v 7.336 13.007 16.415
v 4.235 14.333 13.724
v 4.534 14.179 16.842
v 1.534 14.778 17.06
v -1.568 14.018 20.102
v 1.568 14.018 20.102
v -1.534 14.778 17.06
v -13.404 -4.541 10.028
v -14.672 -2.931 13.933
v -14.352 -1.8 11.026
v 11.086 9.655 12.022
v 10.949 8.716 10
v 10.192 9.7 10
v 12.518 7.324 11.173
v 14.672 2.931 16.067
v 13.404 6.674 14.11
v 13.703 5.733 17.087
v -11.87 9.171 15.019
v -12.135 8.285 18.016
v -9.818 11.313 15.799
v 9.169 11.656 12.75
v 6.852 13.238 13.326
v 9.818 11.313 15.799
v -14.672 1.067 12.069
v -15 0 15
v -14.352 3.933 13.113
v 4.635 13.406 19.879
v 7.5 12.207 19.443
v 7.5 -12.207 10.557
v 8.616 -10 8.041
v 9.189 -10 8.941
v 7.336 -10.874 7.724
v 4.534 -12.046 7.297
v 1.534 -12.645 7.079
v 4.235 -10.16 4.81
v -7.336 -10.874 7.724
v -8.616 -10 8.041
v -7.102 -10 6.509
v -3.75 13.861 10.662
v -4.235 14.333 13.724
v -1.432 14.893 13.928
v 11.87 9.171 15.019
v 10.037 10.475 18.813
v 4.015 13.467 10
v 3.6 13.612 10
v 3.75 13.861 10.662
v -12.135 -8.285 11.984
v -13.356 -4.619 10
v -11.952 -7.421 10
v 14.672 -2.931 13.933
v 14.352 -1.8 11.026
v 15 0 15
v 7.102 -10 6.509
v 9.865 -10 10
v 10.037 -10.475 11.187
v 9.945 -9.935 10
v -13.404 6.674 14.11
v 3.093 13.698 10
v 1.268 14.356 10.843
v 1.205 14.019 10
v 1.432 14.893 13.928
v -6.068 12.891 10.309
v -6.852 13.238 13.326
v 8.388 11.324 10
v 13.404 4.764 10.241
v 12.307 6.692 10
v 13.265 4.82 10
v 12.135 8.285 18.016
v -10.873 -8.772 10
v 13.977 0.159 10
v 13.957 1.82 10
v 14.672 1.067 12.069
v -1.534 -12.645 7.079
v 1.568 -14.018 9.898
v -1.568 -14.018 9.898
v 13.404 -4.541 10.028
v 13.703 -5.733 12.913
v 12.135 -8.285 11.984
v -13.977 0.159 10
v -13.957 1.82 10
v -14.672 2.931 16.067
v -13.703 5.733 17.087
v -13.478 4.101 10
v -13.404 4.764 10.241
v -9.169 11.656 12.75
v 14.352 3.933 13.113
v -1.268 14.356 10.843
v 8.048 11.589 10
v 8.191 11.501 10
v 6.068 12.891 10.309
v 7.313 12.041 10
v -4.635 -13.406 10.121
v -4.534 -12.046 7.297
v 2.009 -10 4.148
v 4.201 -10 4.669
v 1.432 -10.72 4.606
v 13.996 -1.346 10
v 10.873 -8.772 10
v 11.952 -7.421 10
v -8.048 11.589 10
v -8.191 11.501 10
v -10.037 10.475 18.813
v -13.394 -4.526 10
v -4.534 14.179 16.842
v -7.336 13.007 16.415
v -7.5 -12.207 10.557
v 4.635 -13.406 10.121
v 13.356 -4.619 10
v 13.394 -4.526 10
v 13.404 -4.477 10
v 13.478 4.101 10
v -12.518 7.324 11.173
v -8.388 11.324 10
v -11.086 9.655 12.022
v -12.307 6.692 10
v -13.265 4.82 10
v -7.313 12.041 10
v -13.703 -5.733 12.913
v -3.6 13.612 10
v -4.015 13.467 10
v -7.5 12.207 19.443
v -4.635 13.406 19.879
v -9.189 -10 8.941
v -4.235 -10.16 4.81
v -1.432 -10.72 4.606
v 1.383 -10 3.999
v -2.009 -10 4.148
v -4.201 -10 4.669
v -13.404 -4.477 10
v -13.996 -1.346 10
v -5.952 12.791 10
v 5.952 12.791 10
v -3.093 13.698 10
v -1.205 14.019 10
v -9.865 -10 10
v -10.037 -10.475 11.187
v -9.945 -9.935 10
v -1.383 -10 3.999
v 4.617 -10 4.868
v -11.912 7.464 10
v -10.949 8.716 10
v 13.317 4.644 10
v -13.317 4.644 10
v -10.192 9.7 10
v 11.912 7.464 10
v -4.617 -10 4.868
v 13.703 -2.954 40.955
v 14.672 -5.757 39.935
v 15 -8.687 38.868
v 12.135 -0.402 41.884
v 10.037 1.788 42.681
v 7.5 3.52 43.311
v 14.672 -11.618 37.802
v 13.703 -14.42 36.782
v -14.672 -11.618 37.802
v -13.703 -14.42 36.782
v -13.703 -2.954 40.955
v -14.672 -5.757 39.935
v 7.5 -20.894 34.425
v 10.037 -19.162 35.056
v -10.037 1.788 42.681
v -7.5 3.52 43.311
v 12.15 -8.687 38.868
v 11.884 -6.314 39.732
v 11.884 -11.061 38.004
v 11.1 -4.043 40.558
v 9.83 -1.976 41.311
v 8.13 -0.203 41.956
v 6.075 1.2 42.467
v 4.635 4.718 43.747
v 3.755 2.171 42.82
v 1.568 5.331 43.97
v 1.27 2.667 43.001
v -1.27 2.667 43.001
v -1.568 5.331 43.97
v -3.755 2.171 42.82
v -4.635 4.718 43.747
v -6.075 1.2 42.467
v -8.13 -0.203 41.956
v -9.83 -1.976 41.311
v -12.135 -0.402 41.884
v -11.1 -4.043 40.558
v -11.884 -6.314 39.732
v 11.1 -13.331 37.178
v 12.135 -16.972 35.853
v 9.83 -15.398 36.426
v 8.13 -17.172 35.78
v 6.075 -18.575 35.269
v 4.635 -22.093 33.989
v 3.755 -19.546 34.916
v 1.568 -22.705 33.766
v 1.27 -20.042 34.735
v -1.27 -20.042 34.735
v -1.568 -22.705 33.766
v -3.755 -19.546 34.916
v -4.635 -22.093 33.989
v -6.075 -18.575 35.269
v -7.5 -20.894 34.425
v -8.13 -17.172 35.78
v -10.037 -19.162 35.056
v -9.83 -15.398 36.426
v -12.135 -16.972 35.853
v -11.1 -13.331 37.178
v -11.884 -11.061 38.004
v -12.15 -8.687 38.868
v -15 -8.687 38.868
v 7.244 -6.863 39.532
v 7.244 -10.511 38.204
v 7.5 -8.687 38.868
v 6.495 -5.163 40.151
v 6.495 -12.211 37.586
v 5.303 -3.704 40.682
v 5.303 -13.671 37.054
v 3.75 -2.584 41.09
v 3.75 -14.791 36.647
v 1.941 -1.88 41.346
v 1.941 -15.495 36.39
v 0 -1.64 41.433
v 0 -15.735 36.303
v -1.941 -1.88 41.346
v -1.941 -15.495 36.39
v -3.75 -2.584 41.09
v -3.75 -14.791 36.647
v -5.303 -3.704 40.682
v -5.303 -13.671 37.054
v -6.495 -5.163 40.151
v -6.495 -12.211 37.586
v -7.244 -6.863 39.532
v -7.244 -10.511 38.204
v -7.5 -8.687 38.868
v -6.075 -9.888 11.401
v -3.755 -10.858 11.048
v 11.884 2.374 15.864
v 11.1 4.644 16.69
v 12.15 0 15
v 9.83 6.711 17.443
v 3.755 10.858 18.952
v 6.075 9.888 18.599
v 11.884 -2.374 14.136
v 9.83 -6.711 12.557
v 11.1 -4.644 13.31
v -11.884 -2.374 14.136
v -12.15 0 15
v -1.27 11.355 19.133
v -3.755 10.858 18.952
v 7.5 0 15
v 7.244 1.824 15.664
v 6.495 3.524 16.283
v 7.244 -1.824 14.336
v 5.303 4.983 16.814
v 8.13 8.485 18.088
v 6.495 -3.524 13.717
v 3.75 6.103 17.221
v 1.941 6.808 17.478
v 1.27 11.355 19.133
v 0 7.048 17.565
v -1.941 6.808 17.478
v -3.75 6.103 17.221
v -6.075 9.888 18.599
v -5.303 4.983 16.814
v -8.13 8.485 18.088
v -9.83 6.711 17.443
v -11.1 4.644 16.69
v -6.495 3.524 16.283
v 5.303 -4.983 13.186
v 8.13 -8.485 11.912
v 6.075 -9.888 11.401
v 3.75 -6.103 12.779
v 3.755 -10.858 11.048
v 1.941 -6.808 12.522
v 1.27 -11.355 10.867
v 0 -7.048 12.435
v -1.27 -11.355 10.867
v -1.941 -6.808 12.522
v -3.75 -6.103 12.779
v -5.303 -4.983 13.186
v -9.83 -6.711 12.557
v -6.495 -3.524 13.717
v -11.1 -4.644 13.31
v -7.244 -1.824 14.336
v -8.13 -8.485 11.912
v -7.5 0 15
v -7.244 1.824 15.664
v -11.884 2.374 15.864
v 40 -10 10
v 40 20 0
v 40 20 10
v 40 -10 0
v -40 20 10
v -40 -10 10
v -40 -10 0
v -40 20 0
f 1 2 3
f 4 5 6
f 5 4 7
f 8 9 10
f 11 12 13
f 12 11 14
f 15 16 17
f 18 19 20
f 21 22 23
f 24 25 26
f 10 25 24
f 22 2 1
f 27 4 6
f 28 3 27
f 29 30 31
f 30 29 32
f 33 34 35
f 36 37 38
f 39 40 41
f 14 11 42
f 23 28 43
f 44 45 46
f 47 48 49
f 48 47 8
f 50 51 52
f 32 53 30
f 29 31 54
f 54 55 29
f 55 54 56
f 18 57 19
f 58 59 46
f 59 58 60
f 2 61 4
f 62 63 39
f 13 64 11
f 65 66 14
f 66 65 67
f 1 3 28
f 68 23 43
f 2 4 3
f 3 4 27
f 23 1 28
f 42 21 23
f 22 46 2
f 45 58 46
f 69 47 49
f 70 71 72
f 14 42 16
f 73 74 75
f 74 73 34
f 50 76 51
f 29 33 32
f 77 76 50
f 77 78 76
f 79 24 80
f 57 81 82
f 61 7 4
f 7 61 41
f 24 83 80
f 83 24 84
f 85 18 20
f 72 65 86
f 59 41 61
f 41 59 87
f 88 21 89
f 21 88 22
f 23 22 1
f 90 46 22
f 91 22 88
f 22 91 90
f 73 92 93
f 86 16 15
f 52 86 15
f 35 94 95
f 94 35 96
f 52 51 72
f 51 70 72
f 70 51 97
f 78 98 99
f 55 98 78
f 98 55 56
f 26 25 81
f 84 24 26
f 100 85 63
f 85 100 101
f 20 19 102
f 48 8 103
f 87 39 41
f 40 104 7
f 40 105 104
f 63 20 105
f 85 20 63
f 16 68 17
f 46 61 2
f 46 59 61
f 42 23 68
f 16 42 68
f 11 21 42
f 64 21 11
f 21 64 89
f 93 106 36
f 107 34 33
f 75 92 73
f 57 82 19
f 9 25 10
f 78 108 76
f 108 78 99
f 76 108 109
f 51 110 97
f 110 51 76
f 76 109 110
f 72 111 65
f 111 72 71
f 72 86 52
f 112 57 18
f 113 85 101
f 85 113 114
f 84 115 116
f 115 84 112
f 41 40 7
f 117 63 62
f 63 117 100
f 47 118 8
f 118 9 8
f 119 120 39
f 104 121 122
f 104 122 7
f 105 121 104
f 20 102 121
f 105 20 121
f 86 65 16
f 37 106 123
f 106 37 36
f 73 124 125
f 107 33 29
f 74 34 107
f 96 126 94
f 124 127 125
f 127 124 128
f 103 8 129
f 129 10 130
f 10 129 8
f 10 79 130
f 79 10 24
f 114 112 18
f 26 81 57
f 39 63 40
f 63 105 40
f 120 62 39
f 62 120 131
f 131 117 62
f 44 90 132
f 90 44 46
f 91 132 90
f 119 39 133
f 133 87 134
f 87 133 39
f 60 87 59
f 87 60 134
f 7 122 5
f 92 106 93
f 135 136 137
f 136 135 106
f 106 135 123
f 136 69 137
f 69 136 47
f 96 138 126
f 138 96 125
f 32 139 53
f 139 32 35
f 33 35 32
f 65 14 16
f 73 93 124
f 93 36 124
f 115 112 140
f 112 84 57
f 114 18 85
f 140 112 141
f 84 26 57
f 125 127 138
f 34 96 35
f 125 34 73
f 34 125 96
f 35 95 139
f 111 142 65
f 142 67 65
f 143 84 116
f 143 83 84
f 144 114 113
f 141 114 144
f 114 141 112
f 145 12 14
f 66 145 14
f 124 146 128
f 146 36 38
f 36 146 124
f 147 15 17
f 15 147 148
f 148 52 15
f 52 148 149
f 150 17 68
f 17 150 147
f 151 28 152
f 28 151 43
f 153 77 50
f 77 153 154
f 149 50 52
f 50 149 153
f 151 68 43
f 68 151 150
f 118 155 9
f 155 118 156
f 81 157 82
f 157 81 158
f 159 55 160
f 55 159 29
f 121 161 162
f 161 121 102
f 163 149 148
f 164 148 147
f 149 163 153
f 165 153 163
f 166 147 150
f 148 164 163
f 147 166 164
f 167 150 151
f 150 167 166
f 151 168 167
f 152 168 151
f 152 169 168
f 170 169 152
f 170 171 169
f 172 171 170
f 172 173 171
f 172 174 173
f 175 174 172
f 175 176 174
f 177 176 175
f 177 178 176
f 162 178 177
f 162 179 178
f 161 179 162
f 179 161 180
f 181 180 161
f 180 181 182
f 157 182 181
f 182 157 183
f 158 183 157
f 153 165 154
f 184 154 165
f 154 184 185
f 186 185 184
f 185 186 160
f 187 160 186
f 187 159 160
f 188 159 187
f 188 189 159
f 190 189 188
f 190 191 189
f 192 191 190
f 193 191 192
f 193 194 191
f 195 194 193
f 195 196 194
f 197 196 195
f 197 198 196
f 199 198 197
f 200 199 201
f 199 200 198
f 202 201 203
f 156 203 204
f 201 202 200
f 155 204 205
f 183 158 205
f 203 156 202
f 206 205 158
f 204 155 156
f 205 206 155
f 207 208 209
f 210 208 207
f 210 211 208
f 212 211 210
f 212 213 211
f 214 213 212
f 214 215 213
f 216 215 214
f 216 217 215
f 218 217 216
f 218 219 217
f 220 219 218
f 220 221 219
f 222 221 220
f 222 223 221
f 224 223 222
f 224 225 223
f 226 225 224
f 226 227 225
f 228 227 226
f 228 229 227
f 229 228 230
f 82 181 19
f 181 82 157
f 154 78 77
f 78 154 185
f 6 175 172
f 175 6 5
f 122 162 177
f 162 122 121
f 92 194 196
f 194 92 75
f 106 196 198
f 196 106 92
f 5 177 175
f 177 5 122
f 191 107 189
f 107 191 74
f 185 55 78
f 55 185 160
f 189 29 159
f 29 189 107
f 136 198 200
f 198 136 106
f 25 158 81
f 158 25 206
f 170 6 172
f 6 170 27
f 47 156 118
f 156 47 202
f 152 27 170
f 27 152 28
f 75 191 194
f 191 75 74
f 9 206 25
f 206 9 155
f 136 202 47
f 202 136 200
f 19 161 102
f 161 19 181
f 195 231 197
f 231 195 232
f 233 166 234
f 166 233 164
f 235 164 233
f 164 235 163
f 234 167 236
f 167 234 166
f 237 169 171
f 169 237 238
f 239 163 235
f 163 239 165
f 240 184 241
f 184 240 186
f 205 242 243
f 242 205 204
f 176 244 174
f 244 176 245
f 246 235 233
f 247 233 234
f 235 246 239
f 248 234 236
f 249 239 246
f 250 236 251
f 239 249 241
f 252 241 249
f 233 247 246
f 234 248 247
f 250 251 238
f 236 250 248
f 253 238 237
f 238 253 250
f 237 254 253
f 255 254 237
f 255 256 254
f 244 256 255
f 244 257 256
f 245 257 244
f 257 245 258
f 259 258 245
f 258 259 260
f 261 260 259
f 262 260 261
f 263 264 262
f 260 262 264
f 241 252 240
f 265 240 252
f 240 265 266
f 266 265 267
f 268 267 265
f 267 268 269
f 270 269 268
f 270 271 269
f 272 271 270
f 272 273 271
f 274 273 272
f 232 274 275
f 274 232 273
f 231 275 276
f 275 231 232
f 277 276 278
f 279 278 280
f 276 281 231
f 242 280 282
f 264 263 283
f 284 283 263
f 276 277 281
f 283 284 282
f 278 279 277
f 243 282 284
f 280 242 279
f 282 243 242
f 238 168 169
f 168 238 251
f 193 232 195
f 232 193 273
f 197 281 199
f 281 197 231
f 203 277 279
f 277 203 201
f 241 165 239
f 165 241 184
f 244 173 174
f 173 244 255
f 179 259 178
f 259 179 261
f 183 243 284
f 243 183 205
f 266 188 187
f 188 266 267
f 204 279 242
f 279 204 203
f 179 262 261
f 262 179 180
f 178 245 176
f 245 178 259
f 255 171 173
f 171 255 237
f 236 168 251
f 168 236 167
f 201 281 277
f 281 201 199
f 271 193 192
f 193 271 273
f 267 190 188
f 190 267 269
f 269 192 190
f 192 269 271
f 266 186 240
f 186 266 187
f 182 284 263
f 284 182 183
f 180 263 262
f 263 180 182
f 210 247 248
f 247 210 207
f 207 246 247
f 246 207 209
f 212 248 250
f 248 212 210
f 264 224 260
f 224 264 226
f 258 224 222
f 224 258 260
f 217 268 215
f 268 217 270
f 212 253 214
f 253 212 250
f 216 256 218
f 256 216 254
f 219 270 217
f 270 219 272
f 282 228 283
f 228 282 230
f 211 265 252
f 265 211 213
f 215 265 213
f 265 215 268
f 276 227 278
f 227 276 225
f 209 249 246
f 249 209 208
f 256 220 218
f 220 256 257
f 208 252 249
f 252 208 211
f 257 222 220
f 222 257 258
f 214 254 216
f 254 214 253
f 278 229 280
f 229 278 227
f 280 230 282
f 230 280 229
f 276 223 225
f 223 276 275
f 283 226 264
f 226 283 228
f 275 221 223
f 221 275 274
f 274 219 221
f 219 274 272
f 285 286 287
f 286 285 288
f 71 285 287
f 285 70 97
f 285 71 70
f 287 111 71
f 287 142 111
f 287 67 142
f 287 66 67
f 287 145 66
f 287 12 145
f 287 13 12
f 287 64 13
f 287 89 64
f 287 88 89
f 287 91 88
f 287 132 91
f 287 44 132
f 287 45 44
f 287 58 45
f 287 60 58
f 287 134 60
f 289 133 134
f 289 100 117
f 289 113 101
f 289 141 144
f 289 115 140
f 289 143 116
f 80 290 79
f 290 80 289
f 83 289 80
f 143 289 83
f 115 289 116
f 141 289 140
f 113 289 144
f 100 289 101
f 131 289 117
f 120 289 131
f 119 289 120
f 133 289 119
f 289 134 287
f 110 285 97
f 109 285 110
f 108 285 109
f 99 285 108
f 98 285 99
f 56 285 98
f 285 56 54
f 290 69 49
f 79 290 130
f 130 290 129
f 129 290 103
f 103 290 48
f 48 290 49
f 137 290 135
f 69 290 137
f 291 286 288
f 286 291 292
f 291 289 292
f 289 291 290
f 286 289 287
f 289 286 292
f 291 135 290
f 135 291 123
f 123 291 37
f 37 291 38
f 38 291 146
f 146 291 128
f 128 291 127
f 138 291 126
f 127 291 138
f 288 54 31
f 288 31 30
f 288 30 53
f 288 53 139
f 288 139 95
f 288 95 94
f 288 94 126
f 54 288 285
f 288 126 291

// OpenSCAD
// file: lib.scad
OD = 24.5;

module tube(od, id, h){
  difference(){
    color([1, .3, .6])cylinder(d=od, h=h);
    translate([0, 0, -1])cylinder(d=id, h=h + 2);
  }
}
// main file
include <lib.scad>

OD = 24.3;
ID = 15;
inch = 25.4;

thickness = 5;

module leg(){
  tube(OD, ID, 100);
}

module front_foot(){
  difference(){
    union(){
      sphere(d=30);
      cylinder(d=30, h=inch);
    }
    leg();
  }
}

angle = 20;
module back_foot(){
  translate([0, 0, 15])rotate([angle, 0, 0])front_foot();
  translate([-40, -10, 0])cube([80, 30, 10]);
}

back_foot();
